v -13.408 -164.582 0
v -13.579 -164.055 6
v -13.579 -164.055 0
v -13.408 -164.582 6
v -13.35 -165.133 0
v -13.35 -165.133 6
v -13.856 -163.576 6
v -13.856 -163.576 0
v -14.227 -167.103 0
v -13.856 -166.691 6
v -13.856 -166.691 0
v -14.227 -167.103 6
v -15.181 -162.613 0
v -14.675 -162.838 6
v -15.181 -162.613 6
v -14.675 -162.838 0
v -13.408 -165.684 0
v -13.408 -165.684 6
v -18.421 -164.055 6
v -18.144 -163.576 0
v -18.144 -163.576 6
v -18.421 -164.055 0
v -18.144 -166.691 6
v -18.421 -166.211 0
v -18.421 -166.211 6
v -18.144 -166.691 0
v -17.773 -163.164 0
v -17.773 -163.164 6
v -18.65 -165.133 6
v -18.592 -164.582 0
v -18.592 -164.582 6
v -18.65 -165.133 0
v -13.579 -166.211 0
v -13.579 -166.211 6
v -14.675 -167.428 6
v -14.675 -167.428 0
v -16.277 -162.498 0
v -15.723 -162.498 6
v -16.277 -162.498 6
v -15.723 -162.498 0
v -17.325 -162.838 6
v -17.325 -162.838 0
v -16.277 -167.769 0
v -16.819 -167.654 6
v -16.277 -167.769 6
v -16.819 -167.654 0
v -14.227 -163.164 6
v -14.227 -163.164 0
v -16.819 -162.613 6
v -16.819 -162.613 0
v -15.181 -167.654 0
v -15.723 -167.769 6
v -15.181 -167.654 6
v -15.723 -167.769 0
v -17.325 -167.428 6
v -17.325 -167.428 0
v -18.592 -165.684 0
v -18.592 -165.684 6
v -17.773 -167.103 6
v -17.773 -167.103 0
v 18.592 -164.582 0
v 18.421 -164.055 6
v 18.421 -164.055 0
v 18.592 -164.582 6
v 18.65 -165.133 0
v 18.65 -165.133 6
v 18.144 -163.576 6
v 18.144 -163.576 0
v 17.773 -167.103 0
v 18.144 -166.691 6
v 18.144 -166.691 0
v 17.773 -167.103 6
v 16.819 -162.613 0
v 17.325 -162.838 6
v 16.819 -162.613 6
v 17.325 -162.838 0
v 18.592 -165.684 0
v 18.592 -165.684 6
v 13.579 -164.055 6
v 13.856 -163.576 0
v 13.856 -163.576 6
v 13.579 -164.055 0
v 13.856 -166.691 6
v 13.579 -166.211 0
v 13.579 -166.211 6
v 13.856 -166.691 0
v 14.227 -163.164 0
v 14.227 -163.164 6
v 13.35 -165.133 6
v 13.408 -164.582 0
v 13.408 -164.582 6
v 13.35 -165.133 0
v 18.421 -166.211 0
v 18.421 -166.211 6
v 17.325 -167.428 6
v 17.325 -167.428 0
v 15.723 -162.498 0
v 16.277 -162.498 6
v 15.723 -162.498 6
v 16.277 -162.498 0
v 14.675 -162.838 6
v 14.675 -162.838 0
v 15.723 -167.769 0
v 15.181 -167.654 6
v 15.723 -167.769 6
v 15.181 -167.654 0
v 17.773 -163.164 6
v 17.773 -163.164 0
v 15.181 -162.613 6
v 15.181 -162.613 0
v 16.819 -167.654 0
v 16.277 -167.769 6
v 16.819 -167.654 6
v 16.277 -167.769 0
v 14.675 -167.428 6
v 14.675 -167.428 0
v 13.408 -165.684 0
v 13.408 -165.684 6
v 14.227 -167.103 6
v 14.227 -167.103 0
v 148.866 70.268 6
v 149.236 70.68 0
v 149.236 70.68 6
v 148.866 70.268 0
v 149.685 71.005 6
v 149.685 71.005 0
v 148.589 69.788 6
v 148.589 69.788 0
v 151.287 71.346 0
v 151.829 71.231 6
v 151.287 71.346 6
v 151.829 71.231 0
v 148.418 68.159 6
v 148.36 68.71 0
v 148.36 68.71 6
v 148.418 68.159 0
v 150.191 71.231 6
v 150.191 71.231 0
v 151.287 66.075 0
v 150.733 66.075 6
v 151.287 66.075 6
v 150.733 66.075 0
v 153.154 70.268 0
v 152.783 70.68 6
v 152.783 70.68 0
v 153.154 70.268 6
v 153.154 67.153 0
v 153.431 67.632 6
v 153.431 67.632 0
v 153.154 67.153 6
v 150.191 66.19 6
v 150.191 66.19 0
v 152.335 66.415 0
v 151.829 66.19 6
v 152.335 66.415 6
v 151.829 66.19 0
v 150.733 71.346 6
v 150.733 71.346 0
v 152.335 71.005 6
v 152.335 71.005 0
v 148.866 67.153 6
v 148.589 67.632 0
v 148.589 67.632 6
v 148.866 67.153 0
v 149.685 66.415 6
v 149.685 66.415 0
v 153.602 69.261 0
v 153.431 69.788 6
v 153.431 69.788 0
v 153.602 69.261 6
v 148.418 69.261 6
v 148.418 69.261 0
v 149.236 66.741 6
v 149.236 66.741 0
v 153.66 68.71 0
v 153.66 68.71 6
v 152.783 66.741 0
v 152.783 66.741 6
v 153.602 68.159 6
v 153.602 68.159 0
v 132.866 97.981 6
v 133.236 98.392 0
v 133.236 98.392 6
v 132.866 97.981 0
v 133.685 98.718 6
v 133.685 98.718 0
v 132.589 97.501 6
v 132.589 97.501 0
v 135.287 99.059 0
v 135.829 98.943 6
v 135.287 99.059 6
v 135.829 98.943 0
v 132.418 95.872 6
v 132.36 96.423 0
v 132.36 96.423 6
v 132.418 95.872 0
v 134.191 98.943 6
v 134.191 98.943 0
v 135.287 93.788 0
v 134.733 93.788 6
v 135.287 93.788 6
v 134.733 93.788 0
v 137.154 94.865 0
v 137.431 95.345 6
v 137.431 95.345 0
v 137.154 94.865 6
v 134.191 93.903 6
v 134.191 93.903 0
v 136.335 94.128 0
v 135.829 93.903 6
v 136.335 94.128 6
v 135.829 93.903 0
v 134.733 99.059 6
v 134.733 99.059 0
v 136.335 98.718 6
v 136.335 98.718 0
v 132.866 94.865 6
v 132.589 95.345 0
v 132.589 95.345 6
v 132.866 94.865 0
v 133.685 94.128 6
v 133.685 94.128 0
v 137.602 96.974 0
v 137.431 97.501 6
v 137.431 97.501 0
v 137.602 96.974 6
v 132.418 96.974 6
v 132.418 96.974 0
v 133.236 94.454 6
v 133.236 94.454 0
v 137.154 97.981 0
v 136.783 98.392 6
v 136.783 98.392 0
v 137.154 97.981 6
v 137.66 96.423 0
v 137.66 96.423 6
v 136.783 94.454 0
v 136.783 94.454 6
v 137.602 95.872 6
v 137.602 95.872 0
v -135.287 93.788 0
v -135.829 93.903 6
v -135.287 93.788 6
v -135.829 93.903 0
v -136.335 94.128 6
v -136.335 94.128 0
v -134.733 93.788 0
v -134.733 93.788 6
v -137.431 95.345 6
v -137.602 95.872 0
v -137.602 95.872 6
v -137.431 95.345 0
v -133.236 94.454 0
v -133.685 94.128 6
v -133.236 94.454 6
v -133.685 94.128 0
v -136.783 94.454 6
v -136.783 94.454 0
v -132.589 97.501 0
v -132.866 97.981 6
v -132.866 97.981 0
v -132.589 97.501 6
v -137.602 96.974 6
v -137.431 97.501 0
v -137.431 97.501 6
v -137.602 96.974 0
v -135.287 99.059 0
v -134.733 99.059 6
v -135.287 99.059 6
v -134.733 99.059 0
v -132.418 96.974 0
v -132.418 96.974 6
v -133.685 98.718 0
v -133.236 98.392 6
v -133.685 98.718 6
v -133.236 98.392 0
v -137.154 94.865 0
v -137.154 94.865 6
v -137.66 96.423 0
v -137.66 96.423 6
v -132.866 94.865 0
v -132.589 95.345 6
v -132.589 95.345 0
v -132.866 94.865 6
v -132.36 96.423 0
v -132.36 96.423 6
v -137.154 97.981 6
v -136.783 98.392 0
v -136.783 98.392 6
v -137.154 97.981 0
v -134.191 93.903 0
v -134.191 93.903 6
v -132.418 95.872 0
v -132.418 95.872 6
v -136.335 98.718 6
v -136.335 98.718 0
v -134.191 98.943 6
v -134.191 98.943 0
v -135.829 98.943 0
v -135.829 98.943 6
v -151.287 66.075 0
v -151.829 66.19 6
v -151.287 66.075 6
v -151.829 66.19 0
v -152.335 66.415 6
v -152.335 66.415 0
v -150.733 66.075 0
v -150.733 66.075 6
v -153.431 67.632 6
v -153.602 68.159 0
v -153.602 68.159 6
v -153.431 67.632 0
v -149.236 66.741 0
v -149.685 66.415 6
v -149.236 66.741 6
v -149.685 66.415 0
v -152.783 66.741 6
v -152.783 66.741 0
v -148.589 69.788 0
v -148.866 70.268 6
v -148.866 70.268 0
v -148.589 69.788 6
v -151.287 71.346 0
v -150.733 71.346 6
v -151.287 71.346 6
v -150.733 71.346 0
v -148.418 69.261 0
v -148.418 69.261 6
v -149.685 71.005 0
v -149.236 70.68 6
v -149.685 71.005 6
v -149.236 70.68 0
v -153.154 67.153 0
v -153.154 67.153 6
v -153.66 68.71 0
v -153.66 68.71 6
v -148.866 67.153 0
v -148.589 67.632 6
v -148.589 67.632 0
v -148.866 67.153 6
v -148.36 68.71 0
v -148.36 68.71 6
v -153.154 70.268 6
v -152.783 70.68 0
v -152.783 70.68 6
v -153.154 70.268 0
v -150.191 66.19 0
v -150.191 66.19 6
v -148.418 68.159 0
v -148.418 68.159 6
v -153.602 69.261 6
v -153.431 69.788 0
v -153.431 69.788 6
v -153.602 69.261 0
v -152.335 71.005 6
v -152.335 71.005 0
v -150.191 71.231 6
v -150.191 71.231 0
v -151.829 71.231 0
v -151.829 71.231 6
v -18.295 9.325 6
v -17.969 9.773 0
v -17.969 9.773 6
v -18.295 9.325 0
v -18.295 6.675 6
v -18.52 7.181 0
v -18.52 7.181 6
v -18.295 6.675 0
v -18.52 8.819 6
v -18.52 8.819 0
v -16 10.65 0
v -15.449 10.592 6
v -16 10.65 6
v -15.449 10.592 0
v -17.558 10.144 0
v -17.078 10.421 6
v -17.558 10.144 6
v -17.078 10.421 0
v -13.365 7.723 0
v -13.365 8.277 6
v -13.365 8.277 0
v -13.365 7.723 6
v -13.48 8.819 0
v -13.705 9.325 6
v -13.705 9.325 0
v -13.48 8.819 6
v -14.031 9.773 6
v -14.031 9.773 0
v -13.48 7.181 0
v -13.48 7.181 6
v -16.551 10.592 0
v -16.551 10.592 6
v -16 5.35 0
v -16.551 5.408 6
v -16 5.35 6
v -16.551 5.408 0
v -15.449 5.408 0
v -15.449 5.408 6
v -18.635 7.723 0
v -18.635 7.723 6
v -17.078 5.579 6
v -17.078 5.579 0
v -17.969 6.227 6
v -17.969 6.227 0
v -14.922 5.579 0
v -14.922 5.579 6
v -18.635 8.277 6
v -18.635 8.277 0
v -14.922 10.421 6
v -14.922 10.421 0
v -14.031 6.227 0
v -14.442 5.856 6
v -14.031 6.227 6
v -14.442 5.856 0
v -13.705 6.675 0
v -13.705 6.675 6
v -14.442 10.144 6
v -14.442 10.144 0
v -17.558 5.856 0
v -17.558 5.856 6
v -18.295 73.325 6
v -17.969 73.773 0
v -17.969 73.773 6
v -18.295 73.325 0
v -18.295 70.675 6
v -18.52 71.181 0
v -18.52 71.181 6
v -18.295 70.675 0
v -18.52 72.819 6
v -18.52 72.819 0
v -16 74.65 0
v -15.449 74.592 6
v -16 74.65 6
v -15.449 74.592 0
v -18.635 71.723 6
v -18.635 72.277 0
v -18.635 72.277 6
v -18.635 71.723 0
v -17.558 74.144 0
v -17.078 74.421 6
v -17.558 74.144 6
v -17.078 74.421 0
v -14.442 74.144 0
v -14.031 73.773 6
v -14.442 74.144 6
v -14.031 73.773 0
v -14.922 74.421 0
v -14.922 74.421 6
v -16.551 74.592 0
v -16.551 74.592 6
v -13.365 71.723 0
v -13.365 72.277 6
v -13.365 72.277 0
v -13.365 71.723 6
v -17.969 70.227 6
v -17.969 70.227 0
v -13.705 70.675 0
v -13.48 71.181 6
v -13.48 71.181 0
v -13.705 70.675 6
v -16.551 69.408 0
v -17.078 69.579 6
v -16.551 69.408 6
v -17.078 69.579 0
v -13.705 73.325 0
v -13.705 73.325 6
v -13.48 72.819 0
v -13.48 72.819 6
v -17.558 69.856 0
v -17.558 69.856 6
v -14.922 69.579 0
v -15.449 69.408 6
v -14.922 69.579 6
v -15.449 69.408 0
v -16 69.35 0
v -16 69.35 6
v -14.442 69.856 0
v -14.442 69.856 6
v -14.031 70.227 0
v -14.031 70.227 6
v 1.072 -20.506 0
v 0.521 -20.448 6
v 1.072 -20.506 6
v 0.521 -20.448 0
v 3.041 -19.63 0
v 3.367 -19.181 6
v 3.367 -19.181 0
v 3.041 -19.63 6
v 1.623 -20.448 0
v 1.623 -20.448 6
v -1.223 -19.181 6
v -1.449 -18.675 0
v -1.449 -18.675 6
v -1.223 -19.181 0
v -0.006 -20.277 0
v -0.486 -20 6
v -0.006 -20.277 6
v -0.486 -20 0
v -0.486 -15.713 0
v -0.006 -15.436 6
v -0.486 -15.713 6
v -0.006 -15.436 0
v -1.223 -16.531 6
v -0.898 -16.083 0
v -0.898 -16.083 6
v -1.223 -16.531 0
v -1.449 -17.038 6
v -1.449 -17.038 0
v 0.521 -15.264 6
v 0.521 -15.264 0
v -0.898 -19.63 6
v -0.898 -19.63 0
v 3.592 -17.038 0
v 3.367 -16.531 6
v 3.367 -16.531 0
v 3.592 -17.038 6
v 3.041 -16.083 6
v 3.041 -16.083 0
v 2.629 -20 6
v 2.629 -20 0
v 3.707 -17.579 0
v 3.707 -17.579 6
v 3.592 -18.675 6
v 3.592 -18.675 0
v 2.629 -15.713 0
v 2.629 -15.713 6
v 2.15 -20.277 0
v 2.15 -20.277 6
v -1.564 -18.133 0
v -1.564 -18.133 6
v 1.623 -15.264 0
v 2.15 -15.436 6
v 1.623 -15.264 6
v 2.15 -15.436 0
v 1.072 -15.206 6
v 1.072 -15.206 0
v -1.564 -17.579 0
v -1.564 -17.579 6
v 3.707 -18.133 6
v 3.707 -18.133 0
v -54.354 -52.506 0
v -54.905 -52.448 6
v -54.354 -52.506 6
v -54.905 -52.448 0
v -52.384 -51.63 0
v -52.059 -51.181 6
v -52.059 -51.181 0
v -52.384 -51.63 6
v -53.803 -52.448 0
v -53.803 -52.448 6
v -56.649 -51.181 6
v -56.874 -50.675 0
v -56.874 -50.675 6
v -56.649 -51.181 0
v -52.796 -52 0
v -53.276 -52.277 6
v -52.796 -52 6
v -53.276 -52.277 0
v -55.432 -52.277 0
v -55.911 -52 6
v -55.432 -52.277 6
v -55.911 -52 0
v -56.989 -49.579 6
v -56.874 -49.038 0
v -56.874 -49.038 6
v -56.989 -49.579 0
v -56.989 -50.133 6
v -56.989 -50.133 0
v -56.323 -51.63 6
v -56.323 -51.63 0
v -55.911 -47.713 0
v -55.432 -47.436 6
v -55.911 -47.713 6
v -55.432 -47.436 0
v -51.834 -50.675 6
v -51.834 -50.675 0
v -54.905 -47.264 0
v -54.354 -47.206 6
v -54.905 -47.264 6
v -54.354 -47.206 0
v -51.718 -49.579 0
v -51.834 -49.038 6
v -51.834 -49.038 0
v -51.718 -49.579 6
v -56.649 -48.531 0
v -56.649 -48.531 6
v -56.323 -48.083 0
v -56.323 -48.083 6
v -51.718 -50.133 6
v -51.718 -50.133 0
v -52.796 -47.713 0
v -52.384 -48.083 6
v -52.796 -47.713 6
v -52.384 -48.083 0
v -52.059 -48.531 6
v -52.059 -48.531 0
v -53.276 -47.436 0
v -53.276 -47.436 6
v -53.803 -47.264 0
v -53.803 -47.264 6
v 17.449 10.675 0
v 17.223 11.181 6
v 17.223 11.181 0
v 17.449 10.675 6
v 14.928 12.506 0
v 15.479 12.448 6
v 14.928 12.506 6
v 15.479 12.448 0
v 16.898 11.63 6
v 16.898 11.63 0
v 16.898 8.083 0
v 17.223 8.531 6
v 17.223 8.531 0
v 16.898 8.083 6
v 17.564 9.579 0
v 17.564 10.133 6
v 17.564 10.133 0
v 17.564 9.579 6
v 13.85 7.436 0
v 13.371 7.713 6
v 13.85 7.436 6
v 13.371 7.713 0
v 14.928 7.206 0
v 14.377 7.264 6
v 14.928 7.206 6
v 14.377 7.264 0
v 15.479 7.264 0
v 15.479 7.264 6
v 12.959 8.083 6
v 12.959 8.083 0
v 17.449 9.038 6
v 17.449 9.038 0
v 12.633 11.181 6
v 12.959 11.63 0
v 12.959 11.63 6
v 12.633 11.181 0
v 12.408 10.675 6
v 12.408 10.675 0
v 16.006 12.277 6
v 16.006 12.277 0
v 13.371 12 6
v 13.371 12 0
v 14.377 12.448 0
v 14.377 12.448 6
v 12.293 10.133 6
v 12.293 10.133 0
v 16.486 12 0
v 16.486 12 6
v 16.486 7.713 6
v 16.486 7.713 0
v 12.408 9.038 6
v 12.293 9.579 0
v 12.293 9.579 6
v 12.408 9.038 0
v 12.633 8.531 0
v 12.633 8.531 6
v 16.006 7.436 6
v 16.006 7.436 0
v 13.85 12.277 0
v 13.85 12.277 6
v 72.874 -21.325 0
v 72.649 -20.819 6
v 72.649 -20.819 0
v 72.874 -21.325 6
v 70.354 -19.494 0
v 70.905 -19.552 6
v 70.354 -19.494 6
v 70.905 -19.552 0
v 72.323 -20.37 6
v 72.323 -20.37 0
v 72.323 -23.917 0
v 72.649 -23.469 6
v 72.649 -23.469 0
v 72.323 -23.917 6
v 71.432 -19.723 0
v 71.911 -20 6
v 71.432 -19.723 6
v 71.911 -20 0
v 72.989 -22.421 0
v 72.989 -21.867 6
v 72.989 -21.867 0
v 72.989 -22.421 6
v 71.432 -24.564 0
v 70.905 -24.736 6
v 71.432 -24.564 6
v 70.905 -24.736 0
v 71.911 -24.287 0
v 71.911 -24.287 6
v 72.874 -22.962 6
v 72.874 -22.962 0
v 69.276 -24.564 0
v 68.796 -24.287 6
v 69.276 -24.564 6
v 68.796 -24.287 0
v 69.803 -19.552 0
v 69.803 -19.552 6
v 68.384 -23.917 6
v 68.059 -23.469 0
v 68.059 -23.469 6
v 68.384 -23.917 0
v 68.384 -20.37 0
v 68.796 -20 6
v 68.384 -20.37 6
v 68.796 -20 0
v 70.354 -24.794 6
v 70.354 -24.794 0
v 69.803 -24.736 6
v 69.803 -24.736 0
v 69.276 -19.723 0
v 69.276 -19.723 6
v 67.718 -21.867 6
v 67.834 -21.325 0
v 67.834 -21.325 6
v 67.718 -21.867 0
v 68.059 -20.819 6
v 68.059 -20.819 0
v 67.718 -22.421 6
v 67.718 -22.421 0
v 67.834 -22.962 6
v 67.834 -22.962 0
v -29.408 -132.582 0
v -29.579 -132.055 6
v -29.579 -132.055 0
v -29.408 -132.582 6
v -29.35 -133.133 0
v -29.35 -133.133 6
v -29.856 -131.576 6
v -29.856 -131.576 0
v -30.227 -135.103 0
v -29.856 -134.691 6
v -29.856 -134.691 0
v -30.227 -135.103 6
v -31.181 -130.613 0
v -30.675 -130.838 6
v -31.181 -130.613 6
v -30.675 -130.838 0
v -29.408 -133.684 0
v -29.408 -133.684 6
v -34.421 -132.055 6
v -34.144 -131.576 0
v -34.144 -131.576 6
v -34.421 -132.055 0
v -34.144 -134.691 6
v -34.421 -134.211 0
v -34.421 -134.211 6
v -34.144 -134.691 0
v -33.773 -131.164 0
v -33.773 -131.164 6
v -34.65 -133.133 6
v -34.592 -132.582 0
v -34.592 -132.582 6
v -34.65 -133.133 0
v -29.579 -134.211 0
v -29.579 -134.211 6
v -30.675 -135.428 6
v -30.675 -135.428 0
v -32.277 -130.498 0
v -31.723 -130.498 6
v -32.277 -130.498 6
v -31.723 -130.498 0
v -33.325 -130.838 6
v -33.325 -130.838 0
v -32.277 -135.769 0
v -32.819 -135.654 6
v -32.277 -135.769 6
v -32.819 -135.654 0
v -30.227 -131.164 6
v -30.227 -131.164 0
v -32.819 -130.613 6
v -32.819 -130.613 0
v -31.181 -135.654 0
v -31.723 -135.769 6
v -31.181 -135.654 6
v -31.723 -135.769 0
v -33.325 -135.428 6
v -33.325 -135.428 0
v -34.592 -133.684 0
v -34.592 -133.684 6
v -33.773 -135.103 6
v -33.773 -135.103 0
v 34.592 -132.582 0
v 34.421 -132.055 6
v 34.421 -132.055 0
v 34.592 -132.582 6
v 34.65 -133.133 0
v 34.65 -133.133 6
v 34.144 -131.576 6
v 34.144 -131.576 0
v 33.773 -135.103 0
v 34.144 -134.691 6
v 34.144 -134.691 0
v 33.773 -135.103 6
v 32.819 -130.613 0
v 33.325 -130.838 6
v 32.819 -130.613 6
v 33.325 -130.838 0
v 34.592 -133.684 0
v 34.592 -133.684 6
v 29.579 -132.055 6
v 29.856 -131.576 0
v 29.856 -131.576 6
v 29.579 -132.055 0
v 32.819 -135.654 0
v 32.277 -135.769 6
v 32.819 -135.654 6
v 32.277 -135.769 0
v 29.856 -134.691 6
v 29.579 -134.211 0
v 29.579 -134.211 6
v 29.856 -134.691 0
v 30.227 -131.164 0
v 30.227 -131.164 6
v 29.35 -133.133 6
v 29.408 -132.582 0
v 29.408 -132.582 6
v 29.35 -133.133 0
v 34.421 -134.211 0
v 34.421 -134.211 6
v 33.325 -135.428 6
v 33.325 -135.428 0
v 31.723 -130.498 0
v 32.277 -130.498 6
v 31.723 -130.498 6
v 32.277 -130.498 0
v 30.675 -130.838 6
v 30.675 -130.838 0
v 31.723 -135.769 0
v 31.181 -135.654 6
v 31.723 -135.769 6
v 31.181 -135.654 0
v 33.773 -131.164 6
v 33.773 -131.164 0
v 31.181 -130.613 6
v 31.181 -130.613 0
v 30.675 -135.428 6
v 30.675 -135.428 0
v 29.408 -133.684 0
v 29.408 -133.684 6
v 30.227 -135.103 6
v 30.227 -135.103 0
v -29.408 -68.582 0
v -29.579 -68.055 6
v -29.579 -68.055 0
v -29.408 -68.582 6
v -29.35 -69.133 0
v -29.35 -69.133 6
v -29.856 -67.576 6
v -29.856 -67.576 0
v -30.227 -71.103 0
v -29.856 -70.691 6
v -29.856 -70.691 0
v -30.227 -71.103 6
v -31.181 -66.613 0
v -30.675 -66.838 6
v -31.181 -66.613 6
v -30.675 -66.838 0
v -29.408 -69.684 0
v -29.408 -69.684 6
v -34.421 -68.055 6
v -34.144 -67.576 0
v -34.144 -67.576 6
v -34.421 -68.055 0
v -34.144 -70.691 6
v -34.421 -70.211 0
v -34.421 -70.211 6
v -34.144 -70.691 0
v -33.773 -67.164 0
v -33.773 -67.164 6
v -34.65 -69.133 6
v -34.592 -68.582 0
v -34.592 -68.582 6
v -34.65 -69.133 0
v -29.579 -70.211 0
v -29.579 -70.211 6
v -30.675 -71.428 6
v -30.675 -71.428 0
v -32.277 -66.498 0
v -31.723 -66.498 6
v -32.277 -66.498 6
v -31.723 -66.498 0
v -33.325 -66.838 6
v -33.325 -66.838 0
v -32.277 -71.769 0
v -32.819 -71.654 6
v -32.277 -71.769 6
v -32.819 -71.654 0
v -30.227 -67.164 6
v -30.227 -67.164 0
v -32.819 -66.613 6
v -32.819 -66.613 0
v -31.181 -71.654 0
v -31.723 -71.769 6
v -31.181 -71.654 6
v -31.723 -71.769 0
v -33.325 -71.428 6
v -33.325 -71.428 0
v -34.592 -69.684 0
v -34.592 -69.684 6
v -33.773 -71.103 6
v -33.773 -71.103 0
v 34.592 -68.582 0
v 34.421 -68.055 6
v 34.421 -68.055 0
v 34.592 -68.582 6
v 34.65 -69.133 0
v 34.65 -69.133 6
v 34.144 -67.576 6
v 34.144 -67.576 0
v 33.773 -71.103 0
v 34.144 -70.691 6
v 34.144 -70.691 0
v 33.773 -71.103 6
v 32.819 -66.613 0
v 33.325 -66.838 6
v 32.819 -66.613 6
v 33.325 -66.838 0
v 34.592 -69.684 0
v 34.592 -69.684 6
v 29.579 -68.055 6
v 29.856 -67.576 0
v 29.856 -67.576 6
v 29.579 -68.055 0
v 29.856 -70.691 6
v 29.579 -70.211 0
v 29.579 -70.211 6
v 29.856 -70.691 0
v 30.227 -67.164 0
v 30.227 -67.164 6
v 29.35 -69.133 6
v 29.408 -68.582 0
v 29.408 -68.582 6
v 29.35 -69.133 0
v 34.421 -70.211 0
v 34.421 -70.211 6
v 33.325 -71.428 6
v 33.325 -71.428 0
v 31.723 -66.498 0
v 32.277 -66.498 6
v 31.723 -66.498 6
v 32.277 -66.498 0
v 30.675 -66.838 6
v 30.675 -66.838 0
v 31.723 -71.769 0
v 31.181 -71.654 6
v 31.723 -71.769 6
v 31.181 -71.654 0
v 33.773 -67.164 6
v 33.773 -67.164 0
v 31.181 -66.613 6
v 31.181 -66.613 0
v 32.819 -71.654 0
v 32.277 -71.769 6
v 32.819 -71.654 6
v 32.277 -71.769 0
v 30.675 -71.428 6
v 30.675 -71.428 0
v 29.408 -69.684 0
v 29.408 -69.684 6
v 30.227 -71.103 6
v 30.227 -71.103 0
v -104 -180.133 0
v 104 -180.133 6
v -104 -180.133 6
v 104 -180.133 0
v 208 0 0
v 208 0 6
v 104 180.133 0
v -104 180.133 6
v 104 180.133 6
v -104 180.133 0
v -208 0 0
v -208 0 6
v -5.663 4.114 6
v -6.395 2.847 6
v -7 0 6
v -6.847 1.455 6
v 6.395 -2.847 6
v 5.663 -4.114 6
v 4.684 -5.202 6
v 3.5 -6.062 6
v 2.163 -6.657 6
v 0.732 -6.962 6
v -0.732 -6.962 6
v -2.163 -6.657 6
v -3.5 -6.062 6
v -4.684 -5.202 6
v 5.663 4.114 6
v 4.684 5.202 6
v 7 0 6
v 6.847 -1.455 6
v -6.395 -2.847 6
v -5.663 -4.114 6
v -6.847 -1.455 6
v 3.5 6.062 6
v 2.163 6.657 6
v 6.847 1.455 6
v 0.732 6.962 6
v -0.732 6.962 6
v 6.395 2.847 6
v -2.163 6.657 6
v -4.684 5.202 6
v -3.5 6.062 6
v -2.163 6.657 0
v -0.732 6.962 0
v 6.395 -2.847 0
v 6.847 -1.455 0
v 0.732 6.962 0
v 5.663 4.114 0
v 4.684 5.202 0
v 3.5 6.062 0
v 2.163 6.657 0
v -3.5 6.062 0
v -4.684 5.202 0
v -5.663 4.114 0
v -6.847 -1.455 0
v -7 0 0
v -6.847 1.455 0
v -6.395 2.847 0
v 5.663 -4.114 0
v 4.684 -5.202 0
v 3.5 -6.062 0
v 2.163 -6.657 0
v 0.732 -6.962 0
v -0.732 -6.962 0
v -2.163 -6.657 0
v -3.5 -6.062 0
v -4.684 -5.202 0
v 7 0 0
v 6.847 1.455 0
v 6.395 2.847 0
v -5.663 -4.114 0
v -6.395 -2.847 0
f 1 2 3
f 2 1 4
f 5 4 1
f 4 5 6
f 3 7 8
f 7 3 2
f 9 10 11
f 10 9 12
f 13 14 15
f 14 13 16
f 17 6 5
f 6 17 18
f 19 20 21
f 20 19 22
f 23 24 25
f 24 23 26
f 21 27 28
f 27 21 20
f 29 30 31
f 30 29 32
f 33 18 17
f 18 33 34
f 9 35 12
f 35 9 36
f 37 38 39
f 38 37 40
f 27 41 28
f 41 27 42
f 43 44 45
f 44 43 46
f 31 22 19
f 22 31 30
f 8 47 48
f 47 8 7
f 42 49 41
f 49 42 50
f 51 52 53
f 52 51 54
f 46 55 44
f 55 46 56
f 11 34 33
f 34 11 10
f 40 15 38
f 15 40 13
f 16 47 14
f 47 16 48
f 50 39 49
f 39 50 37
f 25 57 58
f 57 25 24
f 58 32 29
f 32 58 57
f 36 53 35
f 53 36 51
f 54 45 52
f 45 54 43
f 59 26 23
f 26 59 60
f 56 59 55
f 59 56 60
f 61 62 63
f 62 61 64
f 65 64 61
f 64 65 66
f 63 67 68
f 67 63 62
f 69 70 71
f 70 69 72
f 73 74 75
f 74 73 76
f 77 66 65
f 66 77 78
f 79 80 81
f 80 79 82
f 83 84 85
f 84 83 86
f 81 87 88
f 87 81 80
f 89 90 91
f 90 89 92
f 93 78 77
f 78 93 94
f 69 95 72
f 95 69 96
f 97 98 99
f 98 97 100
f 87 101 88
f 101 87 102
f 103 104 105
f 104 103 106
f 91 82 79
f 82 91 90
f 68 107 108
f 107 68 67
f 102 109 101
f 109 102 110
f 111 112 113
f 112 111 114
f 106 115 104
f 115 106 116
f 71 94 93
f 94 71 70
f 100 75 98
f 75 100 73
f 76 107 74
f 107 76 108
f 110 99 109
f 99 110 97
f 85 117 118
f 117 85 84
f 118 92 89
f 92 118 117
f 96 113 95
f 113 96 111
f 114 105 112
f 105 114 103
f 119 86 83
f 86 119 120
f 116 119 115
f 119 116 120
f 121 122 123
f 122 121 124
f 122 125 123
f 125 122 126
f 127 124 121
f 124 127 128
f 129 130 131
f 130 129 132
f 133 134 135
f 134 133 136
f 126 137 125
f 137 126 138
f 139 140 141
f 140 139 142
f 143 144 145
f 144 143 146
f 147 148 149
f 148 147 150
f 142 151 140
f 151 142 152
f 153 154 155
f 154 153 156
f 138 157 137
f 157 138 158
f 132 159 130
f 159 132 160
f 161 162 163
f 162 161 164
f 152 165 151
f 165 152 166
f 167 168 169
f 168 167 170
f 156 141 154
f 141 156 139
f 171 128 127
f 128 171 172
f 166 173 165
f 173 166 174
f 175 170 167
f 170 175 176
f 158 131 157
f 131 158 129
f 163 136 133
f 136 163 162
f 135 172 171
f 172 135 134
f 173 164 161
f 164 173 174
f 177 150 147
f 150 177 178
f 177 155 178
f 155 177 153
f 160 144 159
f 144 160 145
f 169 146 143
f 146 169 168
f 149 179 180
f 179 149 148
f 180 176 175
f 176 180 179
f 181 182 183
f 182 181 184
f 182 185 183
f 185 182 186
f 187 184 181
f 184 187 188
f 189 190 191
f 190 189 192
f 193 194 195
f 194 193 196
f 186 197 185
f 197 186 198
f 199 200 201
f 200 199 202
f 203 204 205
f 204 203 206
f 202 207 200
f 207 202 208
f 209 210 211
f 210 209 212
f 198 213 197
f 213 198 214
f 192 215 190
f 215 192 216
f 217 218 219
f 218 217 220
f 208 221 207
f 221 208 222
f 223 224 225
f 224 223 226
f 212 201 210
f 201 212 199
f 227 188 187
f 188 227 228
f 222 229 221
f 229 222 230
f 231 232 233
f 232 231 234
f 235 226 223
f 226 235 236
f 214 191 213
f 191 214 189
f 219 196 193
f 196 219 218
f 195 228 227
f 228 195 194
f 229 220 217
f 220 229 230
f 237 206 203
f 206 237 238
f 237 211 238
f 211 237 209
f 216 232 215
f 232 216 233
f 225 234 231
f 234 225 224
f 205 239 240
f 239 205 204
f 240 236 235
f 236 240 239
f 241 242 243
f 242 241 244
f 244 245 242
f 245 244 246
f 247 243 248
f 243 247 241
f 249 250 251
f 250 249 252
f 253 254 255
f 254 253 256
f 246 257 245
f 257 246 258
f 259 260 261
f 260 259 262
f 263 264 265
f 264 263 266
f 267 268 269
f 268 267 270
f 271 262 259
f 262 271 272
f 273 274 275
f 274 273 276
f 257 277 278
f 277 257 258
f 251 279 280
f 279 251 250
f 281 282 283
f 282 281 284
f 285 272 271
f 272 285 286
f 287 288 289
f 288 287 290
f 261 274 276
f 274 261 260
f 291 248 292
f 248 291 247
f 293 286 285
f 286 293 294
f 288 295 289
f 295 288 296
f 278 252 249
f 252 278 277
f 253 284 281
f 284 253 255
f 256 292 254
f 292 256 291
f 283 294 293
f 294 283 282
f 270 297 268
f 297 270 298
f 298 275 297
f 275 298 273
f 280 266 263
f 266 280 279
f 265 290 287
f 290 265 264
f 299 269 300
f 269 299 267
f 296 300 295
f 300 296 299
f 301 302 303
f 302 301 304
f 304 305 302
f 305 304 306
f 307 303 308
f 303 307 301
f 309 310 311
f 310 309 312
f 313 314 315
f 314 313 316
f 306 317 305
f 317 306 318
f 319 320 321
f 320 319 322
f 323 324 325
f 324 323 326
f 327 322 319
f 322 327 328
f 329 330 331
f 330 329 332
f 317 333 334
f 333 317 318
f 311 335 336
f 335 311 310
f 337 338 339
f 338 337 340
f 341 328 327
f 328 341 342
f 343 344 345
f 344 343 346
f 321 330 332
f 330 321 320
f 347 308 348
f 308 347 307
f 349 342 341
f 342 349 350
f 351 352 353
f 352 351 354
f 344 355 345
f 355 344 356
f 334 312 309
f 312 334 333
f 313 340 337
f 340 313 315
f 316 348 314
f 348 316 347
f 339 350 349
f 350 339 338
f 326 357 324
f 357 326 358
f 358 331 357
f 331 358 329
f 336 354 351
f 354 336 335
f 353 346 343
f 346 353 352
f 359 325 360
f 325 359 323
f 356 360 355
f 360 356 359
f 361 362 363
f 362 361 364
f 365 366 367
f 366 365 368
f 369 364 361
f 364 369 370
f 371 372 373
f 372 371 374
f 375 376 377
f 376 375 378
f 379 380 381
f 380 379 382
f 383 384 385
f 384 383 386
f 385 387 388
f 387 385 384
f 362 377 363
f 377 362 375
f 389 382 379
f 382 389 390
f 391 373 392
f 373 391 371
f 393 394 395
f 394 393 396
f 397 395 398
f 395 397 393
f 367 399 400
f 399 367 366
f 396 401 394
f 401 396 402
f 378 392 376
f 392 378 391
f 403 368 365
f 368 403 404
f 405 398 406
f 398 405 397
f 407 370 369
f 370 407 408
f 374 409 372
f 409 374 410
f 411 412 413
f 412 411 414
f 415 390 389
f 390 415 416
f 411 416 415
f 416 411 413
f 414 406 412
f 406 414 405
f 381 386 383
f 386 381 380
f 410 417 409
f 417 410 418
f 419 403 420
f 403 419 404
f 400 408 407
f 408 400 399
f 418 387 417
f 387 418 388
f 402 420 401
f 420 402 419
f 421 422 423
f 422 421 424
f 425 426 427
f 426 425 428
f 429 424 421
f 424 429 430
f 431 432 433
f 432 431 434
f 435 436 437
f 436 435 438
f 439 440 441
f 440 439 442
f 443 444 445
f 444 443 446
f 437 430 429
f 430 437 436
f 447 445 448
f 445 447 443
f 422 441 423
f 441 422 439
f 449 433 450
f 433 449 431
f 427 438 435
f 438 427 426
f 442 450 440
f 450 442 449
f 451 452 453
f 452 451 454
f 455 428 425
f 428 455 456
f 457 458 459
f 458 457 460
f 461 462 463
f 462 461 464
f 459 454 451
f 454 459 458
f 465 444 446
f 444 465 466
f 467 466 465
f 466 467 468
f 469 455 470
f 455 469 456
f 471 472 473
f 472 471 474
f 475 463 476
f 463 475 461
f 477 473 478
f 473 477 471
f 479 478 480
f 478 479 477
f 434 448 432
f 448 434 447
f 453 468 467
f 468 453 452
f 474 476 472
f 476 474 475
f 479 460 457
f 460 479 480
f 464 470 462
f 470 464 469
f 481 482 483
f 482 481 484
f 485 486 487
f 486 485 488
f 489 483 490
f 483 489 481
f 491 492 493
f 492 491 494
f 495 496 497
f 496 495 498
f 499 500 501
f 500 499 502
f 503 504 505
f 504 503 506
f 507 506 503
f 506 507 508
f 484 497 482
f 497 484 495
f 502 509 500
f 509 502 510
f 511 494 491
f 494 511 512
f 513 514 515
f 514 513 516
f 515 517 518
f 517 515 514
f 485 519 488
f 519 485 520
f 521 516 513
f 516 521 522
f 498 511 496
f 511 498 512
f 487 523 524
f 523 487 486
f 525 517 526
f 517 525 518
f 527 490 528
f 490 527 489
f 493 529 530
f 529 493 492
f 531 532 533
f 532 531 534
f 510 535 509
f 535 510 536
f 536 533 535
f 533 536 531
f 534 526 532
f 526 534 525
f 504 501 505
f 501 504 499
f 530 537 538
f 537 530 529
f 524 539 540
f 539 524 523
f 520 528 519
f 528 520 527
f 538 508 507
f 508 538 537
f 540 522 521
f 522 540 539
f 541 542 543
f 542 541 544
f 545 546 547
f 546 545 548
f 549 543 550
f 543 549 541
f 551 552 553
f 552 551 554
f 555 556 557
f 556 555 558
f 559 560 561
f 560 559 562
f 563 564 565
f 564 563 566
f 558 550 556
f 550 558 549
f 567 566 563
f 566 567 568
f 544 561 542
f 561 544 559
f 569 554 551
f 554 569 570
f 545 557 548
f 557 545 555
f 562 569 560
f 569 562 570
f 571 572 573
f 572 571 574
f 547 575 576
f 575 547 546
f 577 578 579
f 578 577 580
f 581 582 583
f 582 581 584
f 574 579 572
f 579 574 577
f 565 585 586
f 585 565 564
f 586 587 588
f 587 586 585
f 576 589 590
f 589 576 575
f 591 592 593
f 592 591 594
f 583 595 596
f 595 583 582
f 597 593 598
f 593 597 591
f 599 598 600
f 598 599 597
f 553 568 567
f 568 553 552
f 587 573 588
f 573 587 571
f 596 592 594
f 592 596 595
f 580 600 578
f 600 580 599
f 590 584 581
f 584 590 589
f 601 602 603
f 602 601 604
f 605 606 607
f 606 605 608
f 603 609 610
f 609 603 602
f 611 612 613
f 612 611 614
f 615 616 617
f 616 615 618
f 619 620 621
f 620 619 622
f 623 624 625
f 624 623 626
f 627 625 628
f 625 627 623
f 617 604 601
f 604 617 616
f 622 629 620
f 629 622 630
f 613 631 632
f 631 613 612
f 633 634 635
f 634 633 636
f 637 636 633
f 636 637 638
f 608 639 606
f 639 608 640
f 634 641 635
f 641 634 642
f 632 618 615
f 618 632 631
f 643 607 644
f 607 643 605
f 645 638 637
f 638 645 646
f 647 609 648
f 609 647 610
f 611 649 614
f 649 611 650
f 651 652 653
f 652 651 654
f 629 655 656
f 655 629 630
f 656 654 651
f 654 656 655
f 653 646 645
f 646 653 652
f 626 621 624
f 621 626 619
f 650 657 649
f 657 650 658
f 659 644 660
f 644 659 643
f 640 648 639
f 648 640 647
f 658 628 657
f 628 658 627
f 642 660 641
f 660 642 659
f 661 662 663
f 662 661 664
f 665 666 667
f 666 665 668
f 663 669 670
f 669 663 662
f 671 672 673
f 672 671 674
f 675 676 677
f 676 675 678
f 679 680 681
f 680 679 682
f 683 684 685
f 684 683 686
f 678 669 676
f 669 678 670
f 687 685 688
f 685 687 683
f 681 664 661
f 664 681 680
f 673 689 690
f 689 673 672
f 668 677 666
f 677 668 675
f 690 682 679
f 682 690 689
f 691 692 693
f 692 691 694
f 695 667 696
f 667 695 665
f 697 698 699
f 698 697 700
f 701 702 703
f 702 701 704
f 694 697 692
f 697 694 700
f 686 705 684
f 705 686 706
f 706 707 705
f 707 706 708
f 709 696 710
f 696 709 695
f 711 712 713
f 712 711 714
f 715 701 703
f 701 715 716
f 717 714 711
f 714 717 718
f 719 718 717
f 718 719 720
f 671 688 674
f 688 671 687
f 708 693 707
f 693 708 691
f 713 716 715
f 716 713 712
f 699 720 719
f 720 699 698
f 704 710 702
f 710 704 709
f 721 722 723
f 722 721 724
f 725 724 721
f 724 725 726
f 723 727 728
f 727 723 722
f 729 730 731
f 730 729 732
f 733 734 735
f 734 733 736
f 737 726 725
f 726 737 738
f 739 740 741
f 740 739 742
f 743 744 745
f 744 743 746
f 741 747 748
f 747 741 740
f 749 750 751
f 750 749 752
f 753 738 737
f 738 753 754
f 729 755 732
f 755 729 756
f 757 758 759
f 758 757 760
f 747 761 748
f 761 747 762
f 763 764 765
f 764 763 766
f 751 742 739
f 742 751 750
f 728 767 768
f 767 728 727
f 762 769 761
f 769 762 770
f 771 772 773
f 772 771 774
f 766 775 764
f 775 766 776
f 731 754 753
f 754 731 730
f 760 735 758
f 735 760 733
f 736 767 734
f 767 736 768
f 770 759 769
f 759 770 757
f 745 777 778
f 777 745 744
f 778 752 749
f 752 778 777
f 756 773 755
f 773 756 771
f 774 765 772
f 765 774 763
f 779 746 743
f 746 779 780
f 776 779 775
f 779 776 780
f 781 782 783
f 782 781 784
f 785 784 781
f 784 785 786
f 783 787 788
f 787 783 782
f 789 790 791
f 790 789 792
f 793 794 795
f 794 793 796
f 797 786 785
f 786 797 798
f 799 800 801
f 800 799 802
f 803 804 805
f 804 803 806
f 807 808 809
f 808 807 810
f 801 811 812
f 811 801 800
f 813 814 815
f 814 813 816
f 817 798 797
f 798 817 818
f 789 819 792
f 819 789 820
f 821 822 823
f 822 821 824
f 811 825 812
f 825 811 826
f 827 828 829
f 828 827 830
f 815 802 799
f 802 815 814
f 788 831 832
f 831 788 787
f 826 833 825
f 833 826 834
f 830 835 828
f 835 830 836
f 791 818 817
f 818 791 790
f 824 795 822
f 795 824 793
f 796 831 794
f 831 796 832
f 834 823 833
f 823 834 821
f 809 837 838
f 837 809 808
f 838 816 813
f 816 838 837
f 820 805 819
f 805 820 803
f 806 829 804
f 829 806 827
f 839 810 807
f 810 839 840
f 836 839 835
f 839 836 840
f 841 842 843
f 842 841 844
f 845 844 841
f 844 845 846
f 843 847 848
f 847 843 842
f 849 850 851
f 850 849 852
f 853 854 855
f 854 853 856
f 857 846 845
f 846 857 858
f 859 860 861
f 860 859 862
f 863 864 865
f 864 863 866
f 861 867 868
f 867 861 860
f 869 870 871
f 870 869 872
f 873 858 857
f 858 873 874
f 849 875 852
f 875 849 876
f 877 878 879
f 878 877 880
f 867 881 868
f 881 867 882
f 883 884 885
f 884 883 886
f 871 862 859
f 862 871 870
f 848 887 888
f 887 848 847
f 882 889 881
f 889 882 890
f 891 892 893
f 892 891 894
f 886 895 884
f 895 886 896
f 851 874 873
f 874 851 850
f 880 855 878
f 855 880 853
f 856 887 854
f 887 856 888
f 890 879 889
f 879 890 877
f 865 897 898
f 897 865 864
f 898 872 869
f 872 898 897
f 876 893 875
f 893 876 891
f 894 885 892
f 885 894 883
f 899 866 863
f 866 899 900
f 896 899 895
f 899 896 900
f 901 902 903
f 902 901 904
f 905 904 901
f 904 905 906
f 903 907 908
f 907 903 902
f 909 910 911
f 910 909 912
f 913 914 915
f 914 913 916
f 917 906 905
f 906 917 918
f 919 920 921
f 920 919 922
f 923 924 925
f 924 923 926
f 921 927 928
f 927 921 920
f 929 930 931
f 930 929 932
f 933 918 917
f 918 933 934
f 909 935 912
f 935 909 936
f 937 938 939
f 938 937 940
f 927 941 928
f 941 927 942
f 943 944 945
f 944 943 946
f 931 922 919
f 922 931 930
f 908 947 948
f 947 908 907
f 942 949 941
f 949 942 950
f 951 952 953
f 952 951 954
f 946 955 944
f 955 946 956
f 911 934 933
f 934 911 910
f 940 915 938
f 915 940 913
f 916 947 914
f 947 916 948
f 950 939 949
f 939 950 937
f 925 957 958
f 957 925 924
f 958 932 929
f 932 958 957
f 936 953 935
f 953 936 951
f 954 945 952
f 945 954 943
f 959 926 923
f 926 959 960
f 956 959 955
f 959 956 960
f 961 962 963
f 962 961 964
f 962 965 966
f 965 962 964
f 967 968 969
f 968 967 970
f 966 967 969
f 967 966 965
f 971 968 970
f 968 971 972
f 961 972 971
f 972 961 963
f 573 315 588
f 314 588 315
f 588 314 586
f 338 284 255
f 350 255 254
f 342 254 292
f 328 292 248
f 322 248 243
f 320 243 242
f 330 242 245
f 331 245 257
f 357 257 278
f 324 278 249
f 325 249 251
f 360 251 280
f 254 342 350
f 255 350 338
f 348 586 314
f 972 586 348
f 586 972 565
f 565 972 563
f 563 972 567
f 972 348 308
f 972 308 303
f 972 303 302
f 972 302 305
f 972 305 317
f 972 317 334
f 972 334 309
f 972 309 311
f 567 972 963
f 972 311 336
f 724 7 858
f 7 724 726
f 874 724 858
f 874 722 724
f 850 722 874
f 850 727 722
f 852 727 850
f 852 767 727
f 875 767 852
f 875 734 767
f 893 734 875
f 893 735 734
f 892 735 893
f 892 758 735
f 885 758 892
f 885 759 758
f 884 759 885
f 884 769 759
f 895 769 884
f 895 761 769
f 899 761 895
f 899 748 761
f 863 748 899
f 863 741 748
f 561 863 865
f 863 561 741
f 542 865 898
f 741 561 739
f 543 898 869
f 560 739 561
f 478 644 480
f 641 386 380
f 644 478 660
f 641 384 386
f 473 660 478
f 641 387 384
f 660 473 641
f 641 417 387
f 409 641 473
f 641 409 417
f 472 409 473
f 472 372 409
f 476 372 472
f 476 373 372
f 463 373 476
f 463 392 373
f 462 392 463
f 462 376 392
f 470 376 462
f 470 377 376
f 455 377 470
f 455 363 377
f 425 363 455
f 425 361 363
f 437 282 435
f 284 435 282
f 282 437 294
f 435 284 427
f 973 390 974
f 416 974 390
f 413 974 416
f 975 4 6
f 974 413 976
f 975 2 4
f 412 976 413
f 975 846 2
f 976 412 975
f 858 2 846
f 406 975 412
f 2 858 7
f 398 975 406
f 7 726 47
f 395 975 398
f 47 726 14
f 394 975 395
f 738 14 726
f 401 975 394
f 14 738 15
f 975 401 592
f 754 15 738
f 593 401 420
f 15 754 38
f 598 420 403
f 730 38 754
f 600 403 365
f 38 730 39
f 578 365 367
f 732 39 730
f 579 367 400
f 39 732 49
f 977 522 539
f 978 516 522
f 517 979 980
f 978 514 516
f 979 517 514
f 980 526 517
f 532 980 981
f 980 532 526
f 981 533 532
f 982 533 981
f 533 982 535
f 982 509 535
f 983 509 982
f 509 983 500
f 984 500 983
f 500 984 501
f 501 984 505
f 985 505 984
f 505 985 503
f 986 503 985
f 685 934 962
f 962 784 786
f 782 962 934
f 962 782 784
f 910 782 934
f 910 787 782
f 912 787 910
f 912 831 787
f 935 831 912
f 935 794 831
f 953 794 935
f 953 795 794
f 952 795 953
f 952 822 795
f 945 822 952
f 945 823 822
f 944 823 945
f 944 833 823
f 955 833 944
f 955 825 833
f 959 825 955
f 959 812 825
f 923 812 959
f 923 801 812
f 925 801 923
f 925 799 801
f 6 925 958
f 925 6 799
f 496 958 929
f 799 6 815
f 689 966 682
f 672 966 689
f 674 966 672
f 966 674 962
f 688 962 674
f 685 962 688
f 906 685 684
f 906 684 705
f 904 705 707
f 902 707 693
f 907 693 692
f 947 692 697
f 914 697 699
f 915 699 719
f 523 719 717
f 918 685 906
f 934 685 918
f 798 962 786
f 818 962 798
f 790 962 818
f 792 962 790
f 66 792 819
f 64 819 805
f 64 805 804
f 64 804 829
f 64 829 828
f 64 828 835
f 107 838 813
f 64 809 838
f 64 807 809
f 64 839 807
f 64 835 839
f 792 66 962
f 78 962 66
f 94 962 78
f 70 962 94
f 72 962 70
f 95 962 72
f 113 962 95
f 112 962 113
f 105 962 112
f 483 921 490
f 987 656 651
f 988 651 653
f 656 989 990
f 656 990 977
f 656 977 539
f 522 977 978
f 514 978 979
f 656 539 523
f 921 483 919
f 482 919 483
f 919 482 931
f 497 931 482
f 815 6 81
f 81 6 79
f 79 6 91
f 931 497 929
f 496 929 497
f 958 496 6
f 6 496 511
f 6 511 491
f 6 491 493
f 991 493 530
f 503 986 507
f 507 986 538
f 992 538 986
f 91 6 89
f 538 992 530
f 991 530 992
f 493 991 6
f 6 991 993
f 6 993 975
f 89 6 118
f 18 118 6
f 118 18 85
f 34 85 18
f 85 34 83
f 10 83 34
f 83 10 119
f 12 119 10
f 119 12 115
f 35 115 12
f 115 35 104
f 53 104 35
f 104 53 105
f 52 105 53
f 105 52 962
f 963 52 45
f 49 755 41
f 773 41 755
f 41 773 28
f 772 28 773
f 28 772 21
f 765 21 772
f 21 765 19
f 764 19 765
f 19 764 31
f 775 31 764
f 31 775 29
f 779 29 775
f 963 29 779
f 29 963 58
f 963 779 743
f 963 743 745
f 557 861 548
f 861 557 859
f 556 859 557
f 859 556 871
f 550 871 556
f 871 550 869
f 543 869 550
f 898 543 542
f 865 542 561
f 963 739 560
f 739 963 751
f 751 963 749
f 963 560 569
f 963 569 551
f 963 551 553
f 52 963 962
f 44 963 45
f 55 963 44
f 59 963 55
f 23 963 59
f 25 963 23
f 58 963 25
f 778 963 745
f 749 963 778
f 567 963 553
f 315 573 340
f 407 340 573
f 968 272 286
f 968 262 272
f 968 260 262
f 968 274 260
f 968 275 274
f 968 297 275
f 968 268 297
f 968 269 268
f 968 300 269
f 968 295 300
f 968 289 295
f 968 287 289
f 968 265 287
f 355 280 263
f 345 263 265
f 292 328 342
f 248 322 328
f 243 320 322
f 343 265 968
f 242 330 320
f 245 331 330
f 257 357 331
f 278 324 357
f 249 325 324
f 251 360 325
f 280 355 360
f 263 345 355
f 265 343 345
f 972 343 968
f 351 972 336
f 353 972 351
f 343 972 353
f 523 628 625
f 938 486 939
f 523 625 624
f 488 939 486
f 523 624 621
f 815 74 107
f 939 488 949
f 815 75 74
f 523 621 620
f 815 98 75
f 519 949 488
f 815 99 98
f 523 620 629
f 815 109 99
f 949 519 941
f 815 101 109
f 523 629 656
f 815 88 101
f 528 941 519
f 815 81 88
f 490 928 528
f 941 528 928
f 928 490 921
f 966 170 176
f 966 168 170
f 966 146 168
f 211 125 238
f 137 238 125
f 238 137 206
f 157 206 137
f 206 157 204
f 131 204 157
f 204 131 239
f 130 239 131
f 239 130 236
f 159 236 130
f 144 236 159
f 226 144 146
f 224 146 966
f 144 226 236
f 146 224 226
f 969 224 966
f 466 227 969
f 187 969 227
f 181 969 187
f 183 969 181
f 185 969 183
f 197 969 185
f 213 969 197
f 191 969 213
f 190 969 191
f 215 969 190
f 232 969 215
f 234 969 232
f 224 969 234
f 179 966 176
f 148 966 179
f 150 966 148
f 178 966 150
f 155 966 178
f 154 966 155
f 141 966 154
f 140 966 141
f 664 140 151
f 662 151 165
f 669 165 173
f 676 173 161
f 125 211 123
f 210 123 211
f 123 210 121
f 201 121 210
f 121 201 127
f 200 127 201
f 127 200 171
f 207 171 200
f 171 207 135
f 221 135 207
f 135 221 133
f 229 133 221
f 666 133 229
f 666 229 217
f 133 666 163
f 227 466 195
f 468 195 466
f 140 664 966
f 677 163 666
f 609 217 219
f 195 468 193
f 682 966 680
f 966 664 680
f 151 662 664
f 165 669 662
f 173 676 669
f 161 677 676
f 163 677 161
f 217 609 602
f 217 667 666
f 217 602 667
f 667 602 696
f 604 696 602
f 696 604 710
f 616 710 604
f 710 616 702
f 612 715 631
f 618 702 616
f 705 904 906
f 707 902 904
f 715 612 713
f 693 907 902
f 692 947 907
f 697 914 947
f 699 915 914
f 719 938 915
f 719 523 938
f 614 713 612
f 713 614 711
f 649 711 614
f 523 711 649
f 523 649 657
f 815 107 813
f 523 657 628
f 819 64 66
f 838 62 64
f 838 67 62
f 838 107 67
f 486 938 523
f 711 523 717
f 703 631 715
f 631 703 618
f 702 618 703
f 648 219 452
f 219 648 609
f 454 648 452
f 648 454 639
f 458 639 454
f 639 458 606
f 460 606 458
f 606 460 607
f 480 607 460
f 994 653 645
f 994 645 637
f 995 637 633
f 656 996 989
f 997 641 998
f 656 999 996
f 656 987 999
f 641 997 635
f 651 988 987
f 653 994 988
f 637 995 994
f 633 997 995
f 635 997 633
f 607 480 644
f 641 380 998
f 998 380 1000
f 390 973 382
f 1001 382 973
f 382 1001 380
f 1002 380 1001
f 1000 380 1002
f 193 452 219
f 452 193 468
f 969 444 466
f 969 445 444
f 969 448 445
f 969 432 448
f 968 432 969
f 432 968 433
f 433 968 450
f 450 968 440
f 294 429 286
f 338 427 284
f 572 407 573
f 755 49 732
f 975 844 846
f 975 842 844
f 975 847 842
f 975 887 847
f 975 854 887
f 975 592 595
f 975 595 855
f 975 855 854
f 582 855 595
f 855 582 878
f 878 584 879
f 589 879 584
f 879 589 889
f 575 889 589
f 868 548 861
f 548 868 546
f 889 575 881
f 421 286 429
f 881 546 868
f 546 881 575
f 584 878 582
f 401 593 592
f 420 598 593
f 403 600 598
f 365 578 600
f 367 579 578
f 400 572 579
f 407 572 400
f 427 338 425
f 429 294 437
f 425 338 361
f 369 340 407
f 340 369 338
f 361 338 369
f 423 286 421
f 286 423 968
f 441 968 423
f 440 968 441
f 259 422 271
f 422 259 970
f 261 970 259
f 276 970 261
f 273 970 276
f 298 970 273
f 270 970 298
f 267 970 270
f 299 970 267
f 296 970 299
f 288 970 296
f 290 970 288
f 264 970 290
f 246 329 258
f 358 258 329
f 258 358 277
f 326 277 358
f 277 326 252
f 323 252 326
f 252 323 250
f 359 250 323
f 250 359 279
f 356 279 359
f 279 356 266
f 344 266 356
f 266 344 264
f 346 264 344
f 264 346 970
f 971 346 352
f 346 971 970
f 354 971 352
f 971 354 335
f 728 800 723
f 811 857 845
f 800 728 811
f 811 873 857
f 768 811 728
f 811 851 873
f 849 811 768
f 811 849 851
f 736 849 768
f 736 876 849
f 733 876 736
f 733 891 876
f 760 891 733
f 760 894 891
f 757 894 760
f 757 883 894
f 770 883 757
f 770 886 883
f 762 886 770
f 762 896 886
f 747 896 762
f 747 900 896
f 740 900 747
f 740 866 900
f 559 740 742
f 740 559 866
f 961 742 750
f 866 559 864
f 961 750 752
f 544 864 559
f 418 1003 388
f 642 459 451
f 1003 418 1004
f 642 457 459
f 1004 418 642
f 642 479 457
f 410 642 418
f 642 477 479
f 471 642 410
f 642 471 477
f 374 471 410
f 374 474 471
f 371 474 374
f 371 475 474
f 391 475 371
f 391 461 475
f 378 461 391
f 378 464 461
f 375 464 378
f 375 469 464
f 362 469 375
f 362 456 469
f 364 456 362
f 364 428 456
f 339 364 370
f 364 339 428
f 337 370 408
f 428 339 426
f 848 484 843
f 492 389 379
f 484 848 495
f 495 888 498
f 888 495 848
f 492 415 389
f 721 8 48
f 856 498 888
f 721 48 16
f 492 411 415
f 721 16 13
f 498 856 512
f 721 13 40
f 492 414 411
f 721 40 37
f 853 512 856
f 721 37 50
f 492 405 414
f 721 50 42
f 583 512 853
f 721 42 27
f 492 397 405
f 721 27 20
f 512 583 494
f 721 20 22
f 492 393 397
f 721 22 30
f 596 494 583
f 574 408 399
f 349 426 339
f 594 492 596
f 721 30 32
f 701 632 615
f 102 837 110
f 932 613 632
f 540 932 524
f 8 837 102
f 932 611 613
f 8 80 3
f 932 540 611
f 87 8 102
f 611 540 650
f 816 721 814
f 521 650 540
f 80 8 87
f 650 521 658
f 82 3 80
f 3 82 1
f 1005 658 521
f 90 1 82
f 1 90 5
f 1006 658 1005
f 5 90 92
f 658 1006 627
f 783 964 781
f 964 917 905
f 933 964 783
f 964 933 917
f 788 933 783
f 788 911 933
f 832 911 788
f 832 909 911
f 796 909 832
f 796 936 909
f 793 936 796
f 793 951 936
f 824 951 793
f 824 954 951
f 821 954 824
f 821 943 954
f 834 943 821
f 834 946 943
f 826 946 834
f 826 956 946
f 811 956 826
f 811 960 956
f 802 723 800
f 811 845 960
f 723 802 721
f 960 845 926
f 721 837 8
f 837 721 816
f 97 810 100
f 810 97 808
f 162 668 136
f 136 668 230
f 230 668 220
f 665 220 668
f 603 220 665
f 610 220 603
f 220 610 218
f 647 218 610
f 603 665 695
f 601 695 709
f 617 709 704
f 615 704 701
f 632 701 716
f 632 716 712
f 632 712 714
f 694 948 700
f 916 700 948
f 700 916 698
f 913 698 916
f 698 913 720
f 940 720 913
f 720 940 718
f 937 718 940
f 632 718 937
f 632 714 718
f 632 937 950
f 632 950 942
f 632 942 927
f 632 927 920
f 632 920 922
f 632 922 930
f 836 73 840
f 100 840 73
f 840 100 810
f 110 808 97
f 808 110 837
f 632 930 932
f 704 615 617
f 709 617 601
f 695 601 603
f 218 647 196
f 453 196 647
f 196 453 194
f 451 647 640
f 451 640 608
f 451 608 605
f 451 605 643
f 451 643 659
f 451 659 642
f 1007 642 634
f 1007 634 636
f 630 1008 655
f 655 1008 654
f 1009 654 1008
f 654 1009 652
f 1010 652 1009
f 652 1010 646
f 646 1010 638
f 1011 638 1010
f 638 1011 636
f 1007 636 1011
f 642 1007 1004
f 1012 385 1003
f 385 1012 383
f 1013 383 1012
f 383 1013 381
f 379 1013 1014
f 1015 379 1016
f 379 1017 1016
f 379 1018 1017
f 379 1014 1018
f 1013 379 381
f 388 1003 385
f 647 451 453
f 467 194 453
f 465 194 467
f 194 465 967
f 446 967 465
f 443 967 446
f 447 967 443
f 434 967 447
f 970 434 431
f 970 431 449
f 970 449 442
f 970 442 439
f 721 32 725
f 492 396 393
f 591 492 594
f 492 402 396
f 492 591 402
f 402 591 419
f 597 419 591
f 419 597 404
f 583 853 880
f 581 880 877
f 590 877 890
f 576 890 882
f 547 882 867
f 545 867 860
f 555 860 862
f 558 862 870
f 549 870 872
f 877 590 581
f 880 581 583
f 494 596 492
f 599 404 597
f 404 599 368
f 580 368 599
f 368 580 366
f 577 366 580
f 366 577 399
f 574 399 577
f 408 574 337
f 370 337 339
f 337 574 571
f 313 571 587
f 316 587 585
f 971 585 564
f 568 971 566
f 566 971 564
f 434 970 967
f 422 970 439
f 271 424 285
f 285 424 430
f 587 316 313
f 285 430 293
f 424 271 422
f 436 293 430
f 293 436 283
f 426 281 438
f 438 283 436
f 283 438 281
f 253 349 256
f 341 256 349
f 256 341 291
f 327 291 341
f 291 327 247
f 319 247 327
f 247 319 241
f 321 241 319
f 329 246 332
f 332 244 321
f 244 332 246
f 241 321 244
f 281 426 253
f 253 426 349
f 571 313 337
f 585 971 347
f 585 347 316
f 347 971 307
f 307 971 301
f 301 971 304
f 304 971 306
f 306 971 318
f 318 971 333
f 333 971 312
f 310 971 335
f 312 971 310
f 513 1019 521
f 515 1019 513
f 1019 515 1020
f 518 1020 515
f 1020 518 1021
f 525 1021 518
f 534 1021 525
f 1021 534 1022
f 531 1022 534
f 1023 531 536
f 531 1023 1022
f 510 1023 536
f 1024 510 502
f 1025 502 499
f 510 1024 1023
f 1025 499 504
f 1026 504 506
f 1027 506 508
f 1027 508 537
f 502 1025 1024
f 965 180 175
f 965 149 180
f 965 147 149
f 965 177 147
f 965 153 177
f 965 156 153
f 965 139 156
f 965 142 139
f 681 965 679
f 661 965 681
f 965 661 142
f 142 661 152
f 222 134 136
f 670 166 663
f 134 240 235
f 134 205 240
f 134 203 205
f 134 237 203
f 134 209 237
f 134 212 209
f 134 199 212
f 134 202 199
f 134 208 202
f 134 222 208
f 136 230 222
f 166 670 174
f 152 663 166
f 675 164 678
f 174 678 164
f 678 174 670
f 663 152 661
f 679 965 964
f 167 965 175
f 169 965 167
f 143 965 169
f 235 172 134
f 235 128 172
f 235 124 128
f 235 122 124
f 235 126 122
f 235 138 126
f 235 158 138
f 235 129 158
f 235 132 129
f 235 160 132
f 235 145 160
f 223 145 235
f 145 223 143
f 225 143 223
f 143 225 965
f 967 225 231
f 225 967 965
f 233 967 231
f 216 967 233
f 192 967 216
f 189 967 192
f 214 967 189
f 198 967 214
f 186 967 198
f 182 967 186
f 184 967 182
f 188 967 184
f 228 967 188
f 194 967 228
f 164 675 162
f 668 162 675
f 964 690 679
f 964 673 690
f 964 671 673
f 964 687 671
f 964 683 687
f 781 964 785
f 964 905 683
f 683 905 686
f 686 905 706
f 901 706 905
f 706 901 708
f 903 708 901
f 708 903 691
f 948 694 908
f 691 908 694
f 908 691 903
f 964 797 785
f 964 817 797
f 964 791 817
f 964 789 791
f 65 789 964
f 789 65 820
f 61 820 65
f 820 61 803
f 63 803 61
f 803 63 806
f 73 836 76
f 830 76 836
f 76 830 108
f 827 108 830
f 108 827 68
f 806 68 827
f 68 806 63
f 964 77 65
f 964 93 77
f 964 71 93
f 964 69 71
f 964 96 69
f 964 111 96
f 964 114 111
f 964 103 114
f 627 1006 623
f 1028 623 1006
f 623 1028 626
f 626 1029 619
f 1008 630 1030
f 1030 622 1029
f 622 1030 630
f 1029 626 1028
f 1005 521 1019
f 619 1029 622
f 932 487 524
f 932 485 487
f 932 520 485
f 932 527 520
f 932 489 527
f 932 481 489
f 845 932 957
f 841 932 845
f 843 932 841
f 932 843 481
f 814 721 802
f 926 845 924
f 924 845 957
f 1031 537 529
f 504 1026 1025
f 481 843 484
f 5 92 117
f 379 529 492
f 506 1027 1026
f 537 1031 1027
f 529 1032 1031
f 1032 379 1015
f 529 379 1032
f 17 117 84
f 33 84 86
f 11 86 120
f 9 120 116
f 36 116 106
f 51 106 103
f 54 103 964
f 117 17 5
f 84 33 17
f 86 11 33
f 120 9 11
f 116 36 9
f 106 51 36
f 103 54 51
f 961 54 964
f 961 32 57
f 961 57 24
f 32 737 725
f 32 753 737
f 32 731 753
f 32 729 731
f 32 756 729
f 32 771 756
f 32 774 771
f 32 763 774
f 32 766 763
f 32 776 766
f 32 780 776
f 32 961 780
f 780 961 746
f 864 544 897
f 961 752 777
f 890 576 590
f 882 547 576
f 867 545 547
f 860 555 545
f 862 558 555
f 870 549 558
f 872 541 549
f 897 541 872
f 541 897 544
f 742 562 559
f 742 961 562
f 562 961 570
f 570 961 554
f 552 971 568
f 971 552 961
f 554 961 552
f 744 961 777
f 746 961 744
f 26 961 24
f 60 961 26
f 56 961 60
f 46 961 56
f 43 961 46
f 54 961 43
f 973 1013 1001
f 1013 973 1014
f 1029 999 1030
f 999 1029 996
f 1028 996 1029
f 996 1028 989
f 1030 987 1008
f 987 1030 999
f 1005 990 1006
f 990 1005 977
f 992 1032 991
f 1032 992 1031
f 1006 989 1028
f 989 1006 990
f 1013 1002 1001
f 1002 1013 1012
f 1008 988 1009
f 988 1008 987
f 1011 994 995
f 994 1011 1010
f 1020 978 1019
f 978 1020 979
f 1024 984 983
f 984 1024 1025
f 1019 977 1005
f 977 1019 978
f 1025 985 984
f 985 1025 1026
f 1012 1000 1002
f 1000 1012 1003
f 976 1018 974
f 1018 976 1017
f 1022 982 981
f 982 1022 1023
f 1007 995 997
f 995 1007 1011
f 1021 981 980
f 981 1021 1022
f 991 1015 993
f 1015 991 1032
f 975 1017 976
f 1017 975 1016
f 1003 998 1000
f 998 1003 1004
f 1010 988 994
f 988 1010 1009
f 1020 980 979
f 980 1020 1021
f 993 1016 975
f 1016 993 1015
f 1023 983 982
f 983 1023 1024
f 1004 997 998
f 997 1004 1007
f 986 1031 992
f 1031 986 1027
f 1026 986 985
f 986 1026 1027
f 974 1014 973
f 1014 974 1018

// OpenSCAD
// Description: Top plate for Tapster 2 Tablet
// Project home: http://tapsterbot.com

// Slicer settings
// Infill density: 0.5
// Fill pattern: line
// Top/bottom fill pattern: rectilinear

beam_width    = 8;
hole_diameter = 5.3;
hole_radius   = hole_diameter / 2;

plate_radius = beam_width * 26;
distance_of_edge_from_center = sqrt(pow(plate_radius,2)-pow(plate_radius/2,2));
joint_hole_center = distance_of_edge_from_center-15;

module beam(number_of_holes, step=8) {
    beam_length = number_of_holes * 8;
    for (x=[beam_width/2 : step : beam_length]) {
        translate([x-4,beam_width/2-4,-4])
        cylinder(r=hole_radius, h=16, $fn=30);
    }
}


module joint(){   
    translate([-16,-joint_hole_center,-10])
    cylinder(r=hole_radius, h=25, $fn=30);

    translate([16,-joint_hole_center,-10])
    cylinder(r=hole_radius, h=25, $fn=30);
}

module side_connectors() {
    joint();

    rotate(120)
    joint();

    rotate(240)
    joint();
}


// Uncomment 'projection' to create 2D (DXF-able) version
//projection(cut=true) {
union(){
    difference(){
        // Base plate
        cylinder(r=plate_radius, h=6, $fn=6);

        // Center hole
        translate([0,0,-2])
        cylinder(r=7, h=12, $fn=30);

        // Delta-bot leg mounting holes
        side_connectors();

        rotate(90)
        center_connectors();

        rotate(0)
        box();
    }

    rotate([0,0,180])
    translate([0,-50,4])
    linear_extrude(center=true, height=8) import("tapster.dxf");
}
//}


module box() {
        // Bottom row
        for (x=[8 :  beam_width * 8 : beam_width * 9]) {
            translate([x-8*5, -joint_hole_center+32, -10])
            cylinder(r=hole_radius, h=20, $fn=30);
        }

        // Top row
        for (x=[8 : beam_width * 8 : beam_width * 9]) {
            translate([x-8*5, -joint_hole_center+8*8+32, -10])
            cylinder(r=hole_radius, h=20, $fn=30);
       }
}

module center_connectors() {
    translate([8,16,0])
    rotate(a=0)
    beam(10,step=8*8);

    rotate(a=120)
    translate([8,16,0])
    beam(10,step=8*8);

    rotate(a=240)
    translate([8,16,0])
    beam(10,step=8*8);
}
